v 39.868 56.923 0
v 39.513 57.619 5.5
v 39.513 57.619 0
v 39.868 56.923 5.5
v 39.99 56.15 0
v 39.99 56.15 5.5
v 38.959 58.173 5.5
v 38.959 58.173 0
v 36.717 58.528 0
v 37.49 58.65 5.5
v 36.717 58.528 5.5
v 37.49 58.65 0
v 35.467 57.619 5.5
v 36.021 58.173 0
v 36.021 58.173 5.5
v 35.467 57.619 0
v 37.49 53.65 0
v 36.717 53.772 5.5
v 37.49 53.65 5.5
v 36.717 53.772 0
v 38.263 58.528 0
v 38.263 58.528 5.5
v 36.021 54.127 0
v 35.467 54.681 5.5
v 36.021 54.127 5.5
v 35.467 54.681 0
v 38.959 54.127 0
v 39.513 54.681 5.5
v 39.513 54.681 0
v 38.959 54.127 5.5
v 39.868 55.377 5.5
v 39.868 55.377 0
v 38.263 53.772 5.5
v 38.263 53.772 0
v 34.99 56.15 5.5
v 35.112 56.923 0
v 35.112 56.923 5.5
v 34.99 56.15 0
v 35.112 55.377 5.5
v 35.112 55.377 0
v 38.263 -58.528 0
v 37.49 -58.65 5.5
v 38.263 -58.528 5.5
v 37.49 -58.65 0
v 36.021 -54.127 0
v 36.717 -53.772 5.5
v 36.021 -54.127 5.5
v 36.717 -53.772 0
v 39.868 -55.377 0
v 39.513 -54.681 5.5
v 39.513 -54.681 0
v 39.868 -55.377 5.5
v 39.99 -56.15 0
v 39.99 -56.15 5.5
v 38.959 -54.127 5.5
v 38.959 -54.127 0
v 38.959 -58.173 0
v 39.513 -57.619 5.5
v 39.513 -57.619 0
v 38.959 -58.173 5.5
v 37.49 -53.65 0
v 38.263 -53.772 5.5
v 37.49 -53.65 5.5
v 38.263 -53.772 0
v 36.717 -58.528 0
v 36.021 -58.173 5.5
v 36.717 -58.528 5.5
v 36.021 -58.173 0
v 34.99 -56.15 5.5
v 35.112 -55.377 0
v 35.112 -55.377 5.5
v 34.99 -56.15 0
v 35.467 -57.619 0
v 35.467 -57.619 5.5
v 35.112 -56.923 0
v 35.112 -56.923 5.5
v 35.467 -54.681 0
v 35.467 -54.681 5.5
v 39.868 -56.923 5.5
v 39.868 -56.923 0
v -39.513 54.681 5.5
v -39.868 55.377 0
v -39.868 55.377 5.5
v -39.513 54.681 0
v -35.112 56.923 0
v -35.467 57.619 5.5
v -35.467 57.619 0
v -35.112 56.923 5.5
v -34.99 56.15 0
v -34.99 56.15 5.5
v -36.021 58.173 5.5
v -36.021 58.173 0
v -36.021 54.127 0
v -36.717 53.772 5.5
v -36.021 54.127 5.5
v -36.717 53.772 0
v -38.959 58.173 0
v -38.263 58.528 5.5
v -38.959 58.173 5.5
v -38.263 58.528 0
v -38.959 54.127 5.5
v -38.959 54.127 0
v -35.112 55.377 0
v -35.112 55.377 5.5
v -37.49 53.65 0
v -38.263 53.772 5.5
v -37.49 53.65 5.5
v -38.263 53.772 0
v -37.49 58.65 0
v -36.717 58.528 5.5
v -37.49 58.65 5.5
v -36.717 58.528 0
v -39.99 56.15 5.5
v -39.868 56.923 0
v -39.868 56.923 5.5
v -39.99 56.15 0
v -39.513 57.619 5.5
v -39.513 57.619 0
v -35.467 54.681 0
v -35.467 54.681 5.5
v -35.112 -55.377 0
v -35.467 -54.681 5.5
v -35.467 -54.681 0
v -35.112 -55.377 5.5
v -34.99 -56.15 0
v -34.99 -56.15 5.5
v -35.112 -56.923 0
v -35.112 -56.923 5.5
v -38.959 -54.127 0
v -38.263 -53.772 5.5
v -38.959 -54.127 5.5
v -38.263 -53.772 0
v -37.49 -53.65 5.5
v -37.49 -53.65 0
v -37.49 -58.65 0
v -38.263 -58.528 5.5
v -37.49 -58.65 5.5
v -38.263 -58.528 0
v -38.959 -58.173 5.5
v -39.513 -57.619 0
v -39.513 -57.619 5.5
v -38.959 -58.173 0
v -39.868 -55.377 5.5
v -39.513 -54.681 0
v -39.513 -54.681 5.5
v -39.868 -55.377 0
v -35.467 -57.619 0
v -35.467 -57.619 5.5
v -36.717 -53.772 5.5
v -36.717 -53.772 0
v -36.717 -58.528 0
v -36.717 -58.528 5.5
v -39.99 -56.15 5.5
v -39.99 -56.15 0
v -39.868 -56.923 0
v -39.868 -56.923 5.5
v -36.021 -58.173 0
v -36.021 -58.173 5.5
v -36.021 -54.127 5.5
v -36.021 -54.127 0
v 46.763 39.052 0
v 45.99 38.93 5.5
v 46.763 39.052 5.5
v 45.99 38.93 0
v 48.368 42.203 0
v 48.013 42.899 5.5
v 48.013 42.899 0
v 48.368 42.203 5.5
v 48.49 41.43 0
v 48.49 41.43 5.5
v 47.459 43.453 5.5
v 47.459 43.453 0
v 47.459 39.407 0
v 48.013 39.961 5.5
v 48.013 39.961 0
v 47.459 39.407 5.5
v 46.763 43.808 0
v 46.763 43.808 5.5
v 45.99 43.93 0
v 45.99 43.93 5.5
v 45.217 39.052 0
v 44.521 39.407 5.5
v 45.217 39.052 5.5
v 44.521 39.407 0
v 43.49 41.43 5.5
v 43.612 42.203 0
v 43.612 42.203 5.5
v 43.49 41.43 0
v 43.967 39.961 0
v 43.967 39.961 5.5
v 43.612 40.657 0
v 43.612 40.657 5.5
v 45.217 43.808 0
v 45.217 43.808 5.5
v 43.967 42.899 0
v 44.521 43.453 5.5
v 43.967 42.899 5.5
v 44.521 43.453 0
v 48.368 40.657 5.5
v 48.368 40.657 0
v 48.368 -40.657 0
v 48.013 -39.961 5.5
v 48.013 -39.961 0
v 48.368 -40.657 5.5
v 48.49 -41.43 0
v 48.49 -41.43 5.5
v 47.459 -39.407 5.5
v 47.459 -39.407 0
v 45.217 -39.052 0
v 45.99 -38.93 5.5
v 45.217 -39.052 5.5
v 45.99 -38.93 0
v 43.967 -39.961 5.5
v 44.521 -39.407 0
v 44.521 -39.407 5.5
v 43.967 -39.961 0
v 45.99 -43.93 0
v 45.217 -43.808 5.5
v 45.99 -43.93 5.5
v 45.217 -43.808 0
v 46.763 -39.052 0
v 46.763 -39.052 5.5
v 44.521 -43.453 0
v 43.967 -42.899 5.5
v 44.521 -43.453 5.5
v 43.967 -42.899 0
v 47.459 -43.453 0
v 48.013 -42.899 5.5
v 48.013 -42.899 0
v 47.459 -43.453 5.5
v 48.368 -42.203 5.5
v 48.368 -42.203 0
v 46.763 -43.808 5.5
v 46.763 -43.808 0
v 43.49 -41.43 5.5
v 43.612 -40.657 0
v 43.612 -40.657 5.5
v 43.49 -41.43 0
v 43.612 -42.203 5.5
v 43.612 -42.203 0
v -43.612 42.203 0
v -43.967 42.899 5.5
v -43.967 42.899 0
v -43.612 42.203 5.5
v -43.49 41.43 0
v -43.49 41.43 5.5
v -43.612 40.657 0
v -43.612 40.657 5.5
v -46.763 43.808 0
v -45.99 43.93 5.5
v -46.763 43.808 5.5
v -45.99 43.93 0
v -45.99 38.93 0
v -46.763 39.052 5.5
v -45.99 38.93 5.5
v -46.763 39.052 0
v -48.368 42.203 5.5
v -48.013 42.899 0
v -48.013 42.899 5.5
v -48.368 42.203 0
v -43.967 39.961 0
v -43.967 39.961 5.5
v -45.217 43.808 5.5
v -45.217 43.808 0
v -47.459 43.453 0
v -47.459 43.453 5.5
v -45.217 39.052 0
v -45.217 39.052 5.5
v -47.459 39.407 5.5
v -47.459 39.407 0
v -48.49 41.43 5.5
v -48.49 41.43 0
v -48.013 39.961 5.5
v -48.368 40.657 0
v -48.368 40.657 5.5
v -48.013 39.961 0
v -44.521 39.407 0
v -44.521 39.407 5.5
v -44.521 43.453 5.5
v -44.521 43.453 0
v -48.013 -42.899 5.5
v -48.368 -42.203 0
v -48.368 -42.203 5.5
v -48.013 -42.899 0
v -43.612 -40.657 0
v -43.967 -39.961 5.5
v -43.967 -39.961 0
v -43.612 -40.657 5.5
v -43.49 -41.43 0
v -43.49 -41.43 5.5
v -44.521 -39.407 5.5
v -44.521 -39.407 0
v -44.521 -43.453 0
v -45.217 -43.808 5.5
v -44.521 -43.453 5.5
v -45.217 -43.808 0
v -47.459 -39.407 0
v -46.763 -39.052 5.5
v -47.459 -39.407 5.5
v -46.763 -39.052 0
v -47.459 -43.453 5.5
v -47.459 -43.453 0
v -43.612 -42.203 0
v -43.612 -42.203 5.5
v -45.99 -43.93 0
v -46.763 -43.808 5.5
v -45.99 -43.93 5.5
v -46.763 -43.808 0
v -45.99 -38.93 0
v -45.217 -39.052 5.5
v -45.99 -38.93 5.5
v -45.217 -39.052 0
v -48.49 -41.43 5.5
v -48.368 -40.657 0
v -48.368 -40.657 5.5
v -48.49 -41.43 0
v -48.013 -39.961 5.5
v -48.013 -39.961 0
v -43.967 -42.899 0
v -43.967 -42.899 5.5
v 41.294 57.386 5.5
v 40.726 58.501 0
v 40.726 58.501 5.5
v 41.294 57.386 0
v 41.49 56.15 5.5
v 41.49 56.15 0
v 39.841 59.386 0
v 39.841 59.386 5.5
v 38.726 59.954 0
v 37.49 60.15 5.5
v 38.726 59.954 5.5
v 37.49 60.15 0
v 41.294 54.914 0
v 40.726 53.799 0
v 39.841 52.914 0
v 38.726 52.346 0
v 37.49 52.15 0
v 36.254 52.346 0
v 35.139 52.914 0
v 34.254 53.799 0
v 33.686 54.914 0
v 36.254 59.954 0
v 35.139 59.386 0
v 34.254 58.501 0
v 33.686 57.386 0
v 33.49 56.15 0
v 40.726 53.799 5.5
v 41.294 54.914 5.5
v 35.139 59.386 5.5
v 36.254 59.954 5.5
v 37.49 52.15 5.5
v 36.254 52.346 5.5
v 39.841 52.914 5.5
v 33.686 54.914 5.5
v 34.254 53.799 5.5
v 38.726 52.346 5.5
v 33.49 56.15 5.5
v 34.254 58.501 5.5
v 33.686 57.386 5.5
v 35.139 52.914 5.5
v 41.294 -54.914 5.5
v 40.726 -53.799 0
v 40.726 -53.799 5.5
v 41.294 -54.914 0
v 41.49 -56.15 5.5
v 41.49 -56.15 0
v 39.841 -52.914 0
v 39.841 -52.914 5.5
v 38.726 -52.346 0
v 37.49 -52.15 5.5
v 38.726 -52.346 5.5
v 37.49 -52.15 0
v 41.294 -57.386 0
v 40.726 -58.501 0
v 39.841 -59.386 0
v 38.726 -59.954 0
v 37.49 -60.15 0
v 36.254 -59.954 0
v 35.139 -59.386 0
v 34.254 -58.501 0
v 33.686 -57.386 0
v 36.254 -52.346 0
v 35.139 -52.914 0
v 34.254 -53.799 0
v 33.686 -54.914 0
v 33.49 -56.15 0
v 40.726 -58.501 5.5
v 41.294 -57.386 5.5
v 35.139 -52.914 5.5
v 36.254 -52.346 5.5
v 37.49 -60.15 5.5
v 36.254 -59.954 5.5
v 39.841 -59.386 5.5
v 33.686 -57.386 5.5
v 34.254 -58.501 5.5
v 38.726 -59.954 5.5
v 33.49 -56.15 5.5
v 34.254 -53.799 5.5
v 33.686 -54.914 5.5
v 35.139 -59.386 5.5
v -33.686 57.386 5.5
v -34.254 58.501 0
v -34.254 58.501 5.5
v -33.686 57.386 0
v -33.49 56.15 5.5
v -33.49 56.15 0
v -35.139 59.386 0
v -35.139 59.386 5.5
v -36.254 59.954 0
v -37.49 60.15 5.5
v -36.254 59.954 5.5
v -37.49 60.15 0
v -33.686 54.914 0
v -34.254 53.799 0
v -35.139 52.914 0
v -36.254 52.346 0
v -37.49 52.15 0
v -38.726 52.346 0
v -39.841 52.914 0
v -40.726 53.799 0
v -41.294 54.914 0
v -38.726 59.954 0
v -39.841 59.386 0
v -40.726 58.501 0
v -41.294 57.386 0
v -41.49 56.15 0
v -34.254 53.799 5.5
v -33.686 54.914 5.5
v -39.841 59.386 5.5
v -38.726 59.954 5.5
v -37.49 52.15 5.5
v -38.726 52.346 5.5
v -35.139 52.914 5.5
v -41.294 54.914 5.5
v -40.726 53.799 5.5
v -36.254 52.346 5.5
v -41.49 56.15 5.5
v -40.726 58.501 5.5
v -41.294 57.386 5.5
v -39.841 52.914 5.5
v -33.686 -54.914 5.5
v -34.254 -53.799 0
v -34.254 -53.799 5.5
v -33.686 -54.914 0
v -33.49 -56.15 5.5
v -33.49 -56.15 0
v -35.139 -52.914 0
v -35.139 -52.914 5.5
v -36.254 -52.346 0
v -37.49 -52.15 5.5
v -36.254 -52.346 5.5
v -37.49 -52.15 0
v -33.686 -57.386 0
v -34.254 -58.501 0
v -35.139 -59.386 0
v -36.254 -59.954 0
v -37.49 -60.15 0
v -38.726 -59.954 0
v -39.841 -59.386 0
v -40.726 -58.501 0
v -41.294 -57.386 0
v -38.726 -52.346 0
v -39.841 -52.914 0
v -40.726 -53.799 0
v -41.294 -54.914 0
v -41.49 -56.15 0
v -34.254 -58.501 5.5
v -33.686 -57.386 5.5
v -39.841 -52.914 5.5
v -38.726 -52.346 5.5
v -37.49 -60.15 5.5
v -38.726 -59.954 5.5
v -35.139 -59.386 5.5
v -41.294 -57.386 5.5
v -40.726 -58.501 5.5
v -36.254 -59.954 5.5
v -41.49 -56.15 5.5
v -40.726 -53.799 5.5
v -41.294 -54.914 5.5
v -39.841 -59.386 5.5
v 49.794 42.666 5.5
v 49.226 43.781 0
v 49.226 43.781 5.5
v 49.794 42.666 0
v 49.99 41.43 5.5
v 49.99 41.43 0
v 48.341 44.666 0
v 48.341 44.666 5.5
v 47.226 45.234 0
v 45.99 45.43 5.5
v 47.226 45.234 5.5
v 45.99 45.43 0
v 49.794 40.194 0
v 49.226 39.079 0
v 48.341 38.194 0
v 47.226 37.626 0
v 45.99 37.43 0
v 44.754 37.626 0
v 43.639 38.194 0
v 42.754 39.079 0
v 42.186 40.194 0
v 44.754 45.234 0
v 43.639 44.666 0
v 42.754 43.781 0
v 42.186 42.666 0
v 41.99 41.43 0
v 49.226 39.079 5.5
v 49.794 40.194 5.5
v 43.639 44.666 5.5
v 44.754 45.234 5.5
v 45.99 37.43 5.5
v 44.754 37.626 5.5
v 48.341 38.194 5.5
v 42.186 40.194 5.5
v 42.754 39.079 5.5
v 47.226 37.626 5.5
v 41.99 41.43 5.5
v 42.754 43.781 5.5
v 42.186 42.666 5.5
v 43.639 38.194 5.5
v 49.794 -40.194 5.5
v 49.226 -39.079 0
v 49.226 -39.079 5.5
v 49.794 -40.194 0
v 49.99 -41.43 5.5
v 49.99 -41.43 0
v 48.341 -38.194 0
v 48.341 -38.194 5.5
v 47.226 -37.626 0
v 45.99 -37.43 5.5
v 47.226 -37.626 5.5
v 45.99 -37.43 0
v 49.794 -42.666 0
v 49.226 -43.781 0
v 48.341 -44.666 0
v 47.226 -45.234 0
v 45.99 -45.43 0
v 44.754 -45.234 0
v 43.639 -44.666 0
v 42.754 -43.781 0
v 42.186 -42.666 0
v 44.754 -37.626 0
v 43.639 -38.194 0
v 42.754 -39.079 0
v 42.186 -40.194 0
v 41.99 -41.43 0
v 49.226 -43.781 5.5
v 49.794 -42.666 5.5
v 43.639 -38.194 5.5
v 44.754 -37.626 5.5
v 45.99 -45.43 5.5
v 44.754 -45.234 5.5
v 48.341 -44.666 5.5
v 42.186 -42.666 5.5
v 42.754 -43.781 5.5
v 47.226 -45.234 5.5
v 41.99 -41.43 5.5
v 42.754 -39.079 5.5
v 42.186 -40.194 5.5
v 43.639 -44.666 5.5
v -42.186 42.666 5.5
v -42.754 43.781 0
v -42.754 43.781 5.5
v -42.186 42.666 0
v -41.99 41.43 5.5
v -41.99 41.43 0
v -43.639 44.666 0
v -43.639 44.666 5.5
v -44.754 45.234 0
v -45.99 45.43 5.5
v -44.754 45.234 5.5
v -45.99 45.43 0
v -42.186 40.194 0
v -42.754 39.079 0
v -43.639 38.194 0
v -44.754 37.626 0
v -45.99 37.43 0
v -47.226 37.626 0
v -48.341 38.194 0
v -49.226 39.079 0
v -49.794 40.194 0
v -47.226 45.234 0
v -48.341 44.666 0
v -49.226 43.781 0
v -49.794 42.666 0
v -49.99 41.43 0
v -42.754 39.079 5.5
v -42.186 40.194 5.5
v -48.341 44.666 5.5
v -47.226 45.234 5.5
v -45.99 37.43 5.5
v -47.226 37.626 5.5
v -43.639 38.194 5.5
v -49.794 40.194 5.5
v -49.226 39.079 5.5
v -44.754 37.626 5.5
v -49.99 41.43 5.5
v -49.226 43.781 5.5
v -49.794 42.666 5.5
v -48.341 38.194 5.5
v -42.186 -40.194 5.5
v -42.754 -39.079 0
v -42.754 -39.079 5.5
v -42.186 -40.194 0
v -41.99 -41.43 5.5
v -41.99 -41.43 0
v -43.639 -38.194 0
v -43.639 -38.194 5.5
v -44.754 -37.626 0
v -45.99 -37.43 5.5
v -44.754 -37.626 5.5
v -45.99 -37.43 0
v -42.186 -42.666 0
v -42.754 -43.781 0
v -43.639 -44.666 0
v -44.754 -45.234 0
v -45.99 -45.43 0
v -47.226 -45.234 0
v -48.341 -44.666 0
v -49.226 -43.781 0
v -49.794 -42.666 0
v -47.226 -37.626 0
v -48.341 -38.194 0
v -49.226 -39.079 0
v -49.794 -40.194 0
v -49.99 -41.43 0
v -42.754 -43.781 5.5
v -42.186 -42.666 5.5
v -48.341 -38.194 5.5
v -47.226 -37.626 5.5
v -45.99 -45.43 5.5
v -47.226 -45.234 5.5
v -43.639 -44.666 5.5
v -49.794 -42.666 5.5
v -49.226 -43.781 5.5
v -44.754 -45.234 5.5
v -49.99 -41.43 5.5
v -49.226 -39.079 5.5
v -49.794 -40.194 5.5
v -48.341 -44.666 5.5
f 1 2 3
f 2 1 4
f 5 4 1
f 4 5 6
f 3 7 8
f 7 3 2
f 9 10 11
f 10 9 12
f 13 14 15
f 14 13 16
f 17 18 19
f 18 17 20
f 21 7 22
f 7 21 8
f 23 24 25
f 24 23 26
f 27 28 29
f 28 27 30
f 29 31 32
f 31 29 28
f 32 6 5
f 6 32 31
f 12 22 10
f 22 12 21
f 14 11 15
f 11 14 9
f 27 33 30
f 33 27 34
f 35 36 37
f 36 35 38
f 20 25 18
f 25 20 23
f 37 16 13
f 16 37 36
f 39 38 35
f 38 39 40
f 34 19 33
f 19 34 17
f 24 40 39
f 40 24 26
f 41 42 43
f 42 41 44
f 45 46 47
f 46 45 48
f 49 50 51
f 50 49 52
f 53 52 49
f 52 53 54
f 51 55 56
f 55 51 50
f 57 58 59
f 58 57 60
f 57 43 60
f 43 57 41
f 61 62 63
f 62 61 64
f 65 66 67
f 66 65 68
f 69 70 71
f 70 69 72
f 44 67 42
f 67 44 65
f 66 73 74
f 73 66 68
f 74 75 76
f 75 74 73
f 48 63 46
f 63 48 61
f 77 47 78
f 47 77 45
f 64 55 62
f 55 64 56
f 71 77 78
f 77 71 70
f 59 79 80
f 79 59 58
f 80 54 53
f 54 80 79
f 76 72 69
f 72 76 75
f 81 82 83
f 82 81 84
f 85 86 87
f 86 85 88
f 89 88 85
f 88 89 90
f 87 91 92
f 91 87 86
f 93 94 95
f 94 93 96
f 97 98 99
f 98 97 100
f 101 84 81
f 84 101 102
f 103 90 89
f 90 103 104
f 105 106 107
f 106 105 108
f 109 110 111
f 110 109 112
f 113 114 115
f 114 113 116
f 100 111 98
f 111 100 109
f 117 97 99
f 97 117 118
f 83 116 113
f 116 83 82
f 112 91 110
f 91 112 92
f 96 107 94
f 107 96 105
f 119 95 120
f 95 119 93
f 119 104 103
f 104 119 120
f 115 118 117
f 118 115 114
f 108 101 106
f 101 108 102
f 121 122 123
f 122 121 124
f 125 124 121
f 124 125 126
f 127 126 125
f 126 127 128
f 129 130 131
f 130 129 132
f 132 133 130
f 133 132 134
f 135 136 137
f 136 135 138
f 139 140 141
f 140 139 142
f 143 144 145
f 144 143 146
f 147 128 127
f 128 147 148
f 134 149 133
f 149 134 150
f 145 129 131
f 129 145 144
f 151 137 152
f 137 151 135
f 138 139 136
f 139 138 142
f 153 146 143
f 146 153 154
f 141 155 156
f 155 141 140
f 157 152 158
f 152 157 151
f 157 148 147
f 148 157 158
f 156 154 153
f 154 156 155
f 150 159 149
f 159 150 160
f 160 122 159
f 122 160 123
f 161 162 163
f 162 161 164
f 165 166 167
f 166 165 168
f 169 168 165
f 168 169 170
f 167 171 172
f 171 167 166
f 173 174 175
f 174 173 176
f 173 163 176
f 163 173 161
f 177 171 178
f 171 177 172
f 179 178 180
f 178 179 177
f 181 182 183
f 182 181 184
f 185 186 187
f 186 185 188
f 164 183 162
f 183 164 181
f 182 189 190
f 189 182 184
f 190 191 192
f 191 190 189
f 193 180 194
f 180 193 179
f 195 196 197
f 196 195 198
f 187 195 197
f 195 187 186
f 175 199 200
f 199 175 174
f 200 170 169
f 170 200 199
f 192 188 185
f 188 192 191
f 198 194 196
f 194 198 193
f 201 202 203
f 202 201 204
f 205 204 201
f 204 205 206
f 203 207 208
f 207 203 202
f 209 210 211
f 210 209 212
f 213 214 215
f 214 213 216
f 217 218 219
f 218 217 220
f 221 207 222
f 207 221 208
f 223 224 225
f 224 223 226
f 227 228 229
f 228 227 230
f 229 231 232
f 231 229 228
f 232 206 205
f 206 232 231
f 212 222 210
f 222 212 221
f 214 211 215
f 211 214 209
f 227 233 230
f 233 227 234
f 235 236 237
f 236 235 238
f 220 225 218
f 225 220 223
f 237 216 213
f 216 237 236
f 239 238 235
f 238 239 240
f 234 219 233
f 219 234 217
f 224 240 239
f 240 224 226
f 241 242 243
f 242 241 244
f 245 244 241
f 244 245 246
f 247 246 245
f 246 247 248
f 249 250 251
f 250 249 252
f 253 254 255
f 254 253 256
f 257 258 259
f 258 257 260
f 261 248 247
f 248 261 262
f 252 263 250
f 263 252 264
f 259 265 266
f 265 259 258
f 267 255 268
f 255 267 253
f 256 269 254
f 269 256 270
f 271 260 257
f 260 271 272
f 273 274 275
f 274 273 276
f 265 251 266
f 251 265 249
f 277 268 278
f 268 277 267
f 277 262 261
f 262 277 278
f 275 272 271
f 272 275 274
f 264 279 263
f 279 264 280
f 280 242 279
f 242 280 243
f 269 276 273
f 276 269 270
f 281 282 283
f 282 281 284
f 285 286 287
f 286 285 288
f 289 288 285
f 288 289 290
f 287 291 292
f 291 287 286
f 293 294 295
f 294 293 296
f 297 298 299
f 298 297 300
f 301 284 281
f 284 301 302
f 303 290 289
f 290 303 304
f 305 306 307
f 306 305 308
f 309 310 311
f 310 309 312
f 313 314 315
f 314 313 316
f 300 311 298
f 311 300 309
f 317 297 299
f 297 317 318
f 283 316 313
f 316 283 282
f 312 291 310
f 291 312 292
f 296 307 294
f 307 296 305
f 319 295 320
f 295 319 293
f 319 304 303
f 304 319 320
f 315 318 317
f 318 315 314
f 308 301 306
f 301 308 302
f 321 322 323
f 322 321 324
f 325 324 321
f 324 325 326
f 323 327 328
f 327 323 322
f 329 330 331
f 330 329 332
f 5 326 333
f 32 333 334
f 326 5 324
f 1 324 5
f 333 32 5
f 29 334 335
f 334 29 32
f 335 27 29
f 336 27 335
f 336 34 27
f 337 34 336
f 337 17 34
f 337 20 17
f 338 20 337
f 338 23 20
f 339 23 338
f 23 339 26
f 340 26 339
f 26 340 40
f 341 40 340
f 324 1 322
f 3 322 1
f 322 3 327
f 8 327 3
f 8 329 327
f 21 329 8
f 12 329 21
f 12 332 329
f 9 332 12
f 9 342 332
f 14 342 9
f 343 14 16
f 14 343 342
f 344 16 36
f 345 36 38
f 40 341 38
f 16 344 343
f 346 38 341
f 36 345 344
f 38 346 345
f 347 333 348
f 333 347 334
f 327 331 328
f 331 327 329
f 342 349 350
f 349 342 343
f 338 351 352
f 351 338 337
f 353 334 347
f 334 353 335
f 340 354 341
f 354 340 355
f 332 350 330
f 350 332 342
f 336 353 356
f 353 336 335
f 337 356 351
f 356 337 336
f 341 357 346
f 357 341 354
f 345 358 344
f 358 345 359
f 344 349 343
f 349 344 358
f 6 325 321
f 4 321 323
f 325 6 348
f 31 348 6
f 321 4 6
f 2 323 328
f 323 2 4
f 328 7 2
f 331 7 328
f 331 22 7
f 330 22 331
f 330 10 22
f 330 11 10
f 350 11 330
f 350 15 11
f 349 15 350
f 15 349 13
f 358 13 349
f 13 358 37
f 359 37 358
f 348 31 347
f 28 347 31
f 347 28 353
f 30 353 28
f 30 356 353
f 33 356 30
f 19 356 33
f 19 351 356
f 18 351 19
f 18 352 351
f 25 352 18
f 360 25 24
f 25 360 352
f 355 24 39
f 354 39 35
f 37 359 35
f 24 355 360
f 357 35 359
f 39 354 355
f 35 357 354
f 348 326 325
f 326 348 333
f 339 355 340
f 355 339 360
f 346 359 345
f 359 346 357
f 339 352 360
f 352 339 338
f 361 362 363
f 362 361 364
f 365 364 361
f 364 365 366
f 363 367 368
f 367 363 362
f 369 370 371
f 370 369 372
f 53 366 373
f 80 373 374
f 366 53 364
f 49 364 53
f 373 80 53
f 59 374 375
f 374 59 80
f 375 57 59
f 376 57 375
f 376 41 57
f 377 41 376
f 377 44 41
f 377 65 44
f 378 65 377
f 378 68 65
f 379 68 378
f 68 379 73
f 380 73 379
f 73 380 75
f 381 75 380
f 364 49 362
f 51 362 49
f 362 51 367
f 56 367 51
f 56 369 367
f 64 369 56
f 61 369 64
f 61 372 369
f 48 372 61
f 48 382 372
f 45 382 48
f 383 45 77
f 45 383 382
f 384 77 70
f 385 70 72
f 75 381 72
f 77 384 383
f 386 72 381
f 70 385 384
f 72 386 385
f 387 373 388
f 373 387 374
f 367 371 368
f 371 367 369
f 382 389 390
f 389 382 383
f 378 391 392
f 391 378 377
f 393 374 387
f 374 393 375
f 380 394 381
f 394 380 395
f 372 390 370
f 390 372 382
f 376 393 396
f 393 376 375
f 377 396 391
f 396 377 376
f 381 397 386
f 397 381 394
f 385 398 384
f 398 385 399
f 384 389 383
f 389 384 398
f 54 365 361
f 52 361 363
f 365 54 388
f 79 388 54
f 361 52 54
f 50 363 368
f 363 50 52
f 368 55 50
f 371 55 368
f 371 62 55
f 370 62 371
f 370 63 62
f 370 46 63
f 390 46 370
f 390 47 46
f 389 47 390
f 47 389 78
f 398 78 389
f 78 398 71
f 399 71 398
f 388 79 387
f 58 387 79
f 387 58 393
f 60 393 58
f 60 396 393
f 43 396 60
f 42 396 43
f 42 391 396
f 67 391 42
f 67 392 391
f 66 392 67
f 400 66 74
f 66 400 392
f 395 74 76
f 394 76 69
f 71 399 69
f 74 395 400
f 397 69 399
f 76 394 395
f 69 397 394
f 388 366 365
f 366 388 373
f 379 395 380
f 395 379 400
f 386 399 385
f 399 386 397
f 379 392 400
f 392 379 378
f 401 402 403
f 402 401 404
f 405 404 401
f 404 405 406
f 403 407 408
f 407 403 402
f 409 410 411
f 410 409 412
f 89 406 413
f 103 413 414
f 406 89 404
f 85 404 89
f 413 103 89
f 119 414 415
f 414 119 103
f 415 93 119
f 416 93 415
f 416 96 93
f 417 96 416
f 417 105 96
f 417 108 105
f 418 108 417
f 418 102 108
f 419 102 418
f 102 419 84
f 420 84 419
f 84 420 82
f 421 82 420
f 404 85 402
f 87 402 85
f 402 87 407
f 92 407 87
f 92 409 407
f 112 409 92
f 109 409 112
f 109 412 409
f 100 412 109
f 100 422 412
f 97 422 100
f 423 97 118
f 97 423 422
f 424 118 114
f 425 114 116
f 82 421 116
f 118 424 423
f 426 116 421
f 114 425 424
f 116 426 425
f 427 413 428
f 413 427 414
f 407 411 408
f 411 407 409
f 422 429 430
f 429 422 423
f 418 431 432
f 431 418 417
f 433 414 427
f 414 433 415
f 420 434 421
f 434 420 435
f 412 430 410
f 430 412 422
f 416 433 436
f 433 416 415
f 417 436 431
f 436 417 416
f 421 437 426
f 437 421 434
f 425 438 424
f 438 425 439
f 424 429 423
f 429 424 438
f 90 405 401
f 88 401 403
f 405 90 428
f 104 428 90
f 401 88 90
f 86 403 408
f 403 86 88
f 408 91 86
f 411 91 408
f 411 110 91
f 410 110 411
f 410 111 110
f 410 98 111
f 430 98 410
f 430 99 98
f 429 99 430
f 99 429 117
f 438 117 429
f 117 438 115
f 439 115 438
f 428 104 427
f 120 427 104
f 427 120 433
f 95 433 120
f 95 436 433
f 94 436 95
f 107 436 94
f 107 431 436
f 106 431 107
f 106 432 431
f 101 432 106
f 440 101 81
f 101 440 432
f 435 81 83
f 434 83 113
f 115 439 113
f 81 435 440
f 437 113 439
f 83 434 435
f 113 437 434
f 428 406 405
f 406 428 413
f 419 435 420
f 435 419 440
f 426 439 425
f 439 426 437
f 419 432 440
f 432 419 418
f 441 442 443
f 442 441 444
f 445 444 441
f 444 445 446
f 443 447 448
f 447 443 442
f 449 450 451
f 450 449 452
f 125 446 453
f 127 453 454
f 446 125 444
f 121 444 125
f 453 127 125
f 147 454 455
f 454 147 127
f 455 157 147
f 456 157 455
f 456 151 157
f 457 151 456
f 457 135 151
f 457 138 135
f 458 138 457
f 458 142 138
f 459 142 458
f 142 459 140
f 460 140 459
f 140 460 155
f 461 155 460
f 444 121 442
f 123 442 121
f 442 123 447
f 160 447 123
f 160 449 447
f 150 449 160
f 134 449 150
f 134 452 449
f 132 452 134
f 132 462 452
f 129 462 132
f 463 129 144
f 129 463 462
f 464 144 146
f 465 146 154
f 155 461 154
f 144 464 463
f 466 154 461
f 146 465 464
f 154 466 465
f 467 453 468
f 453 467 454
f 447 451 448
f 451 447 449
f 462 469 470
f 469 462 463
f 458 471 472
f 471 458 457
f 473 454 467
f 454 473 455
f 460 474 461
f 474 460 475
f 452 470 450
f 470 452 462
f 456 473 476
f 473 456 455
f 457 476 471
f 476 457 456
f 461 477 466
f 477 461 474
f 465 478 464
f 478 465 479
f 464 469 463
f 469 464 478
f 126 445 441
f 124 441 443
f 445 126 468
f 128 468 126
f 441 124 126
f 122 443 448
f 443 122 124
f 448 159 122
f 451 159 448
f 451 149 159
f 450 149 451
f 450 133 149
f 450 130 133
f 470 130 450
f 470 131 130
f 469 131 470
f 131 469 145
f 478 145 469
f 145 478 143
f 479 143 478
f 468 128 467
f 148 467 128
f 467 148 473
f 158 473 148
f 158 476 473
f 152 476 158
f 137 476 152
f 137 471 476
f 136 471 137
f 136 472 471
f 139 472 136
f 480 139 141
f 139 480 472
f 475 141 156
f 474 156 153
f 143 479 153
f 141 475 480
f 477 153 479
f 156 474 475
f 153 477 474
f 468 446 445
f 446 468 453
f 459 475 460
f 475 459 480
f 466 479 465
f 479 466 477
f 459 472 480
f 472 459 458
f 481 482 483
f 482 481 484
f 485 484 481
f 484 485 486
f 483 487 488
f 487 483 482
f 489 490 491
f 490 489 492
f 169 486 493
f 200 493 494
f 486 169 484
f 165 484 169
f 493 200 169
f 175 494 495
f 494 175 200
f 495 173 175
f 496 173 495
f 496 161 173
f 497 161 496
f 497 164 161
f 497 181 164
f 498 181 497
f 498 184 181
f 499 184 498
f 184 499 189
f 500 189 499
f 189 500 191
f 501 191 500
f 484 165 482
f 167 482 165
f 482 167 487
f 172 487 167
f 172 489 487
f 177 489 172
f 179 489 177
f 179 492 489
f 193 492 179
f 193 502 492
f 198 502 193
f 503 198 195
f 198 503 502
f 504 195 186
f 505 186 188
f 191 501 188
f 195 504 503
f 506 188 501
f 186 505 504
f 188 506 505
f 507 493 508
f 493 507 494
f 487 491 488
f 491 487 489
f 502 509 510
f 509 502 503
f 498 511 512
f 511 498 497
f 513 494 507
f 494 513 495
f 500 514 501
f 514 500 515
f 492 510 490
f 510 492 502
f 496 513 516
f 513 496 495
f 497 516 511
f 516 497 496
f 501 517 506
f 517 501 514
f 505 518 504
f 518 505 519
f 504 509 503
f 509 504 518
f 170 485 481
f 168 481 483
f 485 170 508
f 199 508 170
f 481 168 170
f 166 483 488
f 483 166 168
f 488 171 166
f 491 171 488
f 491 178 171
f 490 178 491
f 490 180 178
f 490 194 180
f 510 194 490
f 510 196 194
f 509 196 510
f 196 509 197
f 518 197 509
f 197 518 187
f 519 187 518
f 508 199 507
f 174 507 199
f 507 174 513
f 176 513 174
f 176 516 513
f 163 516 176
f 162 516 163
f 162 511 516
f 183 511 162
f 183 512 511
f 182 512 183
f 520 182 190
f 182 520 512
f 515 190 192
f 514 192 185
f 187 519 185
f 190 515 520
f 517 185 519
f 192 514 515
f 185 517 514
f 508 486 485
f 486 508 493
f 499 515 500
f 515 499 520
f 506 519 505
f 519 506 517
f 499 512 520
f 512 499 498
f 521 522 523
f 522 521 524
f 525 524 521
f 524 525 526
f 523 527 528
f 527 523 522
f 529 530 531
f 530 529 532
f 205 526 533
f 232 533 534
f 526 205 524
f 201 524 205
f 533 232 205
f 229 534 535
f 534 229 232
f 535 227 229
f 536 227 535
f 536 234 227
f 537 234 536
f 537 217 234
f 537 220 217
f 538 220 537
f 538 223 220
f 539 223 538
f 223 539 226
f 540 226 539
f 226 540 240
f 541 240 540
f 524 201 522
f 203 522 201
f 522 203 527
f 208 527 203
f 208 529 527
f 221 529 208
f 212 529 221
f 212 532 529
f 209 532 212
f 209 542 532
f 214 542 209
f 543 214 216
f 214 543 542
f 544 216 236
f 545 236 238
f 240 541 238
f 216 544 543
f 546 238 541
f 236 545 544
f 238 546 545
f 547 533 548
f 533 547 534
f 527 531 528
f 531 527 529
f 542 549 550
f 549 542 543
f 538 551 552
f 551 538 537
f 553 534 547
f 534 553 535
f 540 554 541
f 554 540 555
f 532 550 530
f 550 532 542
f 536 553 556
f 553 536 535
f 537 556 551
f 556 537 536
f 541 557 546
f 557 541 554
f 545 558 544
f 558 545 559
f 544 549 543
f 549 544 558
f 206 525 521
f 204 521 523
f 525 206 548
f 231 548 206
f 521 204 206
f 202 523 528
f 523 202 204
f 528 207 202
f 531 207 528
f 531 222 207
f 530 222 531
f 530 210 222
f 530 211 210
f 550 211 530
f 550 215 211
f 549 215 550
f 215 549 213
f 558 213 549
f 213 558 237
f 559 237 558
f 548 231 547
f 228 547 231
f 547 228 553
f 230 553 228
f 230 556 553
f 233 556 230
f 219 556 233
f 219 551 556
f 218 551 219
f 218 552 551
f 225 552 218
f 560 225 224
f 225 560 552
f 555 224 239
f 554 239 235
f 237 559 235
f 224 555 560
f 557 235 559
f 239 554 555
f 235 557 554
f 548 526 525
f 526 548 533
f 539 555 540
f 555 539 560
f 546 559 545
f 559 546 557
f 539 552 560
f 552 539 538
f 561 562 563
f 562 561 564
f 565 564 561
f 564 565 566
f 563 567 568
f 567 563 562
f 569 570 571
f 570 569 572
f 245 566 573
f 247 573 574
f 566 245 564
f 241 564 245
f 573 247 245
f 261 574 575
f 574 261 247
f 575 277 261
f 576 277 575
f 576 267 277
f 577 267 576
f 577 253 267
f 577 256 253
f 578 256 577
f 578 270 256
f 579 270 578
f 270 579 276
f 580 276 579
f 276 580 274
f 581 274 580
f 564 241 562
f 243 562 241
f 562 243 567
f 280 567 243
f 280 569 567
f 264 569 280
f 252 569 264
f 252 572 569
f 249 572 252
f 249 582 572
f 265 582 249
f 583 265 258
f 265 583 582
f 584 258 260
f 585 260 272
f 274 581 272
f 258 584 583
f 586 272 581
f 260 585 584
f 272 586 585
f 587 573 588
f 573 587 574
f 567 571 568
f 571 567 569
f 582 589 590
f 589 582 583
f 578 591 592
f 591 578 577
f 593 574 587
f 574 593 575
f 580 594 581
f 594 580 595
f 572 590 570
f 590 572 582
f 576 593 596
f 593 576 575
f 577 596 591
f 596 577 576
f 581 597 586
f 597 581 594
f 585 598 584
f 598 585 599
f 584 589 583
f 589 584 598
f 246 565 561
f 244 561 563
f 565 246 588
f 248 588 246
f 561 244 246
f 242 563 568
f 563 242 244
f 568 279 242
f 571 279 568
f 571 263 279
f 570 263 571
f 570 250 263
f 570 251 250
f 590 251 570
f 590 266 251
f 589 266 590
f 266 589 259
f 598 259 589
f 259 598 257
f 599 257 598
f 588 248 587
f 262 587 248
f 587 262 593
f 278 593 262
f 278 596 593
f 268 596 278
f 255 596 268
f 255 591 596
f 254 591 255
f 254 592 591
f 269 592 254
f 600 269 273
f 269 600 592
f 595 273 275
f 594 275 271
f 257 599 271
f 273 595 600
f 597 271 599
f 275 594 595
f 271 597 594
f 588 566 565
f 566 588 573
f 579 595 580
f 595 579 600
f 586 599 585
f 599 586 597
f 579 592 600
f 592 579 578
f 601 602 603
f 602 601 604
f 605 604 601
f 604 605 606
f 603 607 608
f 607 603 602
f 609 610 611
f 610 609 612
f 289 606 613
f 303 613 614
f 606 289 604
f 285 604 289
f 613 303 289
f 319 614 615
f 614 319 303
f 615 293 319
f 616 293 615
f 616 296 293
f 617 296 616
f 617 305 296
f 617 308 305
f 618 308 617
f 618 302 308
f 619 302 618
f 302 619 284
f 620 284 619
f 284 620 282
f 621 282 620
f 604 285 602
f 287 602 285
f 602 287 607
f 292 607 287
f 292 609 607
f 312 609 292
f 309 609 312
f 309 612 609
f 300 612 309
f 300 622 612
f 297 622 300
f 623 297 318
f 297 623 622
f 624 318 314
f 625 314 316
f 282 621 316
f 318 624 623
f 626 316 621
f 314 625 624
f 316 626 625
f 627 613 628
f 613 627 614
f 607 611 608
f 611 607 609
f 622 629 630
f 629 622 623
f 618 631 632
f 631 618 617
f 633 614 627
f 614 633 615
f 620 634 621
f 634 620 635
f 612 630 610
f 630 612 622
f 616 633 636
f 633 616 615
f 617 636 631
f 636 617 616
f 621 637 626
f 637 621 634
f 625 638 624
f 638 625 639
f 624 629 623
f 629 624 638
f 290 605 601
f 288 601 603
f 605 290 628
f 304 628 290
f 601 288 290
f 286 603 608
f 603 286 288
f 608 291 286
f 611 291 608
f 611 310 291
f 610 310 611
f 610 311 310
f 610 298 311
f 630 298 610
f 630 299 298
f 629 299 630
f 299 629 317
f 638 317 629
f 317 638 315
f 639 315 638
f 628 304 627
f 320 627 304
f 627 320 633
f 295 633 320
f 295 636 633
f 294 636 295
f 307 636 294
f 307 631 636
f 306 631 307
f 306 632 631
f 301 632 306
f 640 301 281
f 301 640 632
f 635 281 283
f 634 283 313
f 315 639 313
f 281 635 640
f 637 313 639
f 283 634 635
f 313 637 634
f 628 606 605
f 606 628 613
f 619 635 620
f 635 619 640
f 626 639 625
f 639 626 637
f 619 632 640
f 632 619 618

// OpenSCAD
// file: teal_drone_top_cover_plain_parameters.scad
// teal_drone_top_cover_plain_parameters.scad
//
// Driving parameters for: teal_drone_top_cover_plain.scad
//
// By Gregg Christopher, 2017
// This file is released under the Creative Commons - Attribution license. 
// http://creativecommons.org/licenses/by/3.0/

// Mounting Bracket Height: The case shape should try to minimize overhangs below this height. 
mounting_bracket_h = 5.5; 
// Mounting Bracket Lip Height: Force an exact match to the Teal Sport drone shape up to this height.
mounting_bracket_lip_h = 0.5;
// Mounting Bracket Slope Scale: Used to determine the overhang slope in the bracket portion of the top case.
mounting_bracket_slope_scale = 0.9;
mounting_bracket_inner_slop_distance = 3;
// Mounting Bracket Outer Thickness: The bracket will be this thick at the base.
mounting_bracket_outer_thickness = 4;
// Case Top Thickness: How thick the case should be at a horizontal point. This should be the thinnest part of the case.
case_top_thickness = 2;

mounting_clip_inner_r = 2.5; // Radius of holes for mounting to body of Teal Sport Drone
mounting_clip_outer_r = 4; // Outer radius of holders for  mounting to body of Teal Sport Drone
mounting_clip_hole_positions = [ [37.49, 56.15], [37.49, -56.15], [-37.49, 56.15], [-37.49, -56.15],
                                 [45.99, 41.43], [45.99, -41.43], [-45.99, 41.43], [-45.99, -41.43] ];
// main file
// teal_drone_top_cover_plain.scad
//
// OpenSCAD implementation of a top cover for the Teal Sport drone that is very
// close in size and shape to that provided by the manufacturer at:
// https://www.thingiverse.com/thing:2597372
//
// This model is intended to serve as a base for further development, while 
// allowing easier and precise changes because it starts from code and a .dxf
// outline instead of a 3d model. 
//
// By Gregg Christopher, 2017
// This file is released under the Creative Commons - Attribution license. 
// http://creativecommons.org/licenses/by/3.0/

// Module summary:
// 
// case_outer_volume() : Exterior dimensions of the plain case.
// case_inner_volume() : Cutout for the interior space of the plain case.
// case_clip_fittings() : Mounting brackets and supports for mating to the drone body.
// case_mounting_clip_holes() : Cutout for the holes in the mounting bracket.
// teal_cover_plain() : A complete plain case assembled from those four volumes.

// Infinitesimal value for ensuring manifold shapes and other special uses. 
slop = 0.01;

include <teal_drone_top_cover_plain_parameters.scad>

// Use a few spheroids to get close to the shape of the bulging ends
// of the plain Teal Drone top cover. This volume can be tweaked to
// make more internal space if needed. 
module approximate_end_bulge() {
  // These were not calculated. They were adjusted by hand until it looked nice.
  hull() {
    color([0, 0, 1, 0.6])
    translate([0, -46.5, mounting_bracket_lip_h - 9])
    scale([.78, .415, 0.25])
    sphere(r = 82, $fn = 120);

    color([0, 0, 1, 0.6])
    translate([0, -41, mounting_bracket_lip_h - 9])
    scale([.795, .428, 0.28])
    sphere(r = 80, $fn = 120);
    
    color([0, 1, 0, 0.6])
    translate([0, -36, mounting_bracket_lip_h - 9])
    scale([.77, .51, 0.29])
    sphere(r = 80, $fn = 120);
  }
}

// The Teal Sport drone has a stylishly slim waistline. Use a toroid
// to trim our bulbous cover shape down to one close to matching.
// The actual contour of the toroid is taken from the drone lip shape.
module toroidal_cutout() {
  // This sequence of geometric operations is NOT the result of any fancy
  // analysis. It just moves the shape to roughly the right place and 
  // scales it to be close to fitting. 
  translate([0, 0, -8])
  scale([0.96, 1, 0.35])
  rotate([90, 0, 0])
  rotate_extrude($fn = 80)
  translate([8, 0])
  projection()
  linear_extrude(height = slop)
  difference() {
    translate([0, -35])
    square([80, 70]);
    import("teal_top_cover_outline.dxf");
  }
}

module case_outer_volume() {
  // Exact case lip, from a projection of the plain Teal Sport drone cover: 
  // https://www.thingiverse.com/thing:2597372
  linear_extrude(height = mounting_bracket_lip_h)
  import("teal_top_cover_outline.dxf");

  // Hull together bulges at either end, then chop the toroidal volume
  // out to make the slimmer center. 
  intersection() {
    difference() {
      hull() {
        approximate_end_bulge();
        mirror([0, 1, 0])
        approximate_end_bulge();
      }
      toroidal_cutout();
    }  
    linear_extrude(height = 50)
    import("teal_top_cover_outline.dxf");
  }
}

module case_inner_volume() {
  // Exact thickness bottom lip guarantees correct mating with the drone.
  translate([0, 0, -slop])
  linear_extrude(height = mounting_bracket_lip_h + 2*slop)
  offset(r = -mounting_bracket_outer_thickness)
  import("teal_top_cover_outline.dxf");
  
  // Since the case is mostly horizontal, the rest of the inner volume is defined by dropping 
  // the outer volume by case_top_thickness mm, then subtracting some material from the rim
  // so that the edge forms a nice printable shape of the desired bracket height. (mounting_bracket_h)
  intersection() {
    difference() {
      translate([0, 0, -case_top_thickness])
      hull() {
        approximate_end_bulge();
        mirror([0, 1, 0])
        approximate_end_bulge();
      }
        
      translate([0, 0, -case_top_thickness])
      toroidal_cutout();
      
      difference() {
        translate([0, 0, mounting_bracket_lip_h])
        linear_extrude(height = mounting_bracket_h - mounting_bracket_lip_h + 10)
        import("teal_top_cover_outline.dxf");
        
        // Remove the edges of the interior area to limit overhang angles.
        translate([0, 0, mounting_bracket_lip_h - slop])
        linear_extrude(height = mounting_bracket_h - mounting_bracket_lip_h + 2*slop, scale = mounting_bracket_slope_scale)
        offset(r = -mounting_bracket_outer_thickness)
        import("teal_top_cover_outline.dxf");      

        // Extend the top of the limited area straught upward to keep the profile concave.
        translate([0, 0, mounting_bracket_h - slop])
        linear_extrude(height = 10)
        scale([mounting_bracket_slope_scale, mounting_bracket_slope_scale])
        offset(r = -mounting_bracket_outer_thickness)
        import("teal_top_cover_outline.dxf");      

      }
    }  
    linear_extrude(height = 50)
    offset(r = -mounting_bracket_outer_thickness)
    import("teal_top_cover_outline.dxf");
  }  
}

module case_mounting_clip_holes() {
  for(pos = mounting_clip_hole_positions) {
    translate([pos[0], pos[1], -slop])
    cylinder(r = mounting_clip_inner_r, h = mounting_bracket_h + 2*slop, $fn = 20);
  }
}

module case_clip_fittings() {
  difference() {
    union() {
      // Mounting clip outer sections
      for(pos = mounting_clip_hole_positions) {
        translate([pos[0], pos[1], 0])
        cylinder(r = mounting_clip_outer_r, h = mounting_bracket_h, $fn = 20);
      }

      // Brace sections
      intersection() {
        case_outer_volume();
        for(pos = mounting_clip_hole_positions) {
          translate([pos[0], pos[1], -slop])
          for(rot = [atan2(-pos[0], pos[1]/2) + 30, atan2(-pos[0], pos[1]/2) - 30])
          rotate([0, 0, rot])
          translate([-mounting_bracket_outer_thickness/4, 0, 0])
          cube([mounting_bracket_outer_thickness/2, 20, mounting_bracket_h]);
        }
      }
    }
    
    case_mounting_clip_holes();
  }
}

module teal_cover_plain() {
  difference() {
    case_outer_volume();
    case_inner_volume();
    case_mounting_clip_holes();
  }
  difference() {
    case_clip_fittings();
    case_mounting_clip_holes();  
  }
}

render() // All those hulls and differences are slow. Pre-render to make life easier. 
teal_cover_plain();

// Compare the generated cover with the provided one?
// TealTopCoverBlank1.STL can be found at: https://www.thingiverse.com/thing:2597372

// %translate([-60+0.35, 80+2.1, -10+0.5])
// rotate([90, 0, 0])
// import("TealTopCoverBlank1.STL", convexity = 10);

// Preview the rotor keep-out area?

for(x = [101, -101]) {
  for(y = [83, -83]) {
    // Prop keep-out area estimates:
    %color([0.3, 0.3, 0.7, 0.4])
    translate([x, y, 8.25])
    cylinder(r = 127/2, h = 10);
  }
}
